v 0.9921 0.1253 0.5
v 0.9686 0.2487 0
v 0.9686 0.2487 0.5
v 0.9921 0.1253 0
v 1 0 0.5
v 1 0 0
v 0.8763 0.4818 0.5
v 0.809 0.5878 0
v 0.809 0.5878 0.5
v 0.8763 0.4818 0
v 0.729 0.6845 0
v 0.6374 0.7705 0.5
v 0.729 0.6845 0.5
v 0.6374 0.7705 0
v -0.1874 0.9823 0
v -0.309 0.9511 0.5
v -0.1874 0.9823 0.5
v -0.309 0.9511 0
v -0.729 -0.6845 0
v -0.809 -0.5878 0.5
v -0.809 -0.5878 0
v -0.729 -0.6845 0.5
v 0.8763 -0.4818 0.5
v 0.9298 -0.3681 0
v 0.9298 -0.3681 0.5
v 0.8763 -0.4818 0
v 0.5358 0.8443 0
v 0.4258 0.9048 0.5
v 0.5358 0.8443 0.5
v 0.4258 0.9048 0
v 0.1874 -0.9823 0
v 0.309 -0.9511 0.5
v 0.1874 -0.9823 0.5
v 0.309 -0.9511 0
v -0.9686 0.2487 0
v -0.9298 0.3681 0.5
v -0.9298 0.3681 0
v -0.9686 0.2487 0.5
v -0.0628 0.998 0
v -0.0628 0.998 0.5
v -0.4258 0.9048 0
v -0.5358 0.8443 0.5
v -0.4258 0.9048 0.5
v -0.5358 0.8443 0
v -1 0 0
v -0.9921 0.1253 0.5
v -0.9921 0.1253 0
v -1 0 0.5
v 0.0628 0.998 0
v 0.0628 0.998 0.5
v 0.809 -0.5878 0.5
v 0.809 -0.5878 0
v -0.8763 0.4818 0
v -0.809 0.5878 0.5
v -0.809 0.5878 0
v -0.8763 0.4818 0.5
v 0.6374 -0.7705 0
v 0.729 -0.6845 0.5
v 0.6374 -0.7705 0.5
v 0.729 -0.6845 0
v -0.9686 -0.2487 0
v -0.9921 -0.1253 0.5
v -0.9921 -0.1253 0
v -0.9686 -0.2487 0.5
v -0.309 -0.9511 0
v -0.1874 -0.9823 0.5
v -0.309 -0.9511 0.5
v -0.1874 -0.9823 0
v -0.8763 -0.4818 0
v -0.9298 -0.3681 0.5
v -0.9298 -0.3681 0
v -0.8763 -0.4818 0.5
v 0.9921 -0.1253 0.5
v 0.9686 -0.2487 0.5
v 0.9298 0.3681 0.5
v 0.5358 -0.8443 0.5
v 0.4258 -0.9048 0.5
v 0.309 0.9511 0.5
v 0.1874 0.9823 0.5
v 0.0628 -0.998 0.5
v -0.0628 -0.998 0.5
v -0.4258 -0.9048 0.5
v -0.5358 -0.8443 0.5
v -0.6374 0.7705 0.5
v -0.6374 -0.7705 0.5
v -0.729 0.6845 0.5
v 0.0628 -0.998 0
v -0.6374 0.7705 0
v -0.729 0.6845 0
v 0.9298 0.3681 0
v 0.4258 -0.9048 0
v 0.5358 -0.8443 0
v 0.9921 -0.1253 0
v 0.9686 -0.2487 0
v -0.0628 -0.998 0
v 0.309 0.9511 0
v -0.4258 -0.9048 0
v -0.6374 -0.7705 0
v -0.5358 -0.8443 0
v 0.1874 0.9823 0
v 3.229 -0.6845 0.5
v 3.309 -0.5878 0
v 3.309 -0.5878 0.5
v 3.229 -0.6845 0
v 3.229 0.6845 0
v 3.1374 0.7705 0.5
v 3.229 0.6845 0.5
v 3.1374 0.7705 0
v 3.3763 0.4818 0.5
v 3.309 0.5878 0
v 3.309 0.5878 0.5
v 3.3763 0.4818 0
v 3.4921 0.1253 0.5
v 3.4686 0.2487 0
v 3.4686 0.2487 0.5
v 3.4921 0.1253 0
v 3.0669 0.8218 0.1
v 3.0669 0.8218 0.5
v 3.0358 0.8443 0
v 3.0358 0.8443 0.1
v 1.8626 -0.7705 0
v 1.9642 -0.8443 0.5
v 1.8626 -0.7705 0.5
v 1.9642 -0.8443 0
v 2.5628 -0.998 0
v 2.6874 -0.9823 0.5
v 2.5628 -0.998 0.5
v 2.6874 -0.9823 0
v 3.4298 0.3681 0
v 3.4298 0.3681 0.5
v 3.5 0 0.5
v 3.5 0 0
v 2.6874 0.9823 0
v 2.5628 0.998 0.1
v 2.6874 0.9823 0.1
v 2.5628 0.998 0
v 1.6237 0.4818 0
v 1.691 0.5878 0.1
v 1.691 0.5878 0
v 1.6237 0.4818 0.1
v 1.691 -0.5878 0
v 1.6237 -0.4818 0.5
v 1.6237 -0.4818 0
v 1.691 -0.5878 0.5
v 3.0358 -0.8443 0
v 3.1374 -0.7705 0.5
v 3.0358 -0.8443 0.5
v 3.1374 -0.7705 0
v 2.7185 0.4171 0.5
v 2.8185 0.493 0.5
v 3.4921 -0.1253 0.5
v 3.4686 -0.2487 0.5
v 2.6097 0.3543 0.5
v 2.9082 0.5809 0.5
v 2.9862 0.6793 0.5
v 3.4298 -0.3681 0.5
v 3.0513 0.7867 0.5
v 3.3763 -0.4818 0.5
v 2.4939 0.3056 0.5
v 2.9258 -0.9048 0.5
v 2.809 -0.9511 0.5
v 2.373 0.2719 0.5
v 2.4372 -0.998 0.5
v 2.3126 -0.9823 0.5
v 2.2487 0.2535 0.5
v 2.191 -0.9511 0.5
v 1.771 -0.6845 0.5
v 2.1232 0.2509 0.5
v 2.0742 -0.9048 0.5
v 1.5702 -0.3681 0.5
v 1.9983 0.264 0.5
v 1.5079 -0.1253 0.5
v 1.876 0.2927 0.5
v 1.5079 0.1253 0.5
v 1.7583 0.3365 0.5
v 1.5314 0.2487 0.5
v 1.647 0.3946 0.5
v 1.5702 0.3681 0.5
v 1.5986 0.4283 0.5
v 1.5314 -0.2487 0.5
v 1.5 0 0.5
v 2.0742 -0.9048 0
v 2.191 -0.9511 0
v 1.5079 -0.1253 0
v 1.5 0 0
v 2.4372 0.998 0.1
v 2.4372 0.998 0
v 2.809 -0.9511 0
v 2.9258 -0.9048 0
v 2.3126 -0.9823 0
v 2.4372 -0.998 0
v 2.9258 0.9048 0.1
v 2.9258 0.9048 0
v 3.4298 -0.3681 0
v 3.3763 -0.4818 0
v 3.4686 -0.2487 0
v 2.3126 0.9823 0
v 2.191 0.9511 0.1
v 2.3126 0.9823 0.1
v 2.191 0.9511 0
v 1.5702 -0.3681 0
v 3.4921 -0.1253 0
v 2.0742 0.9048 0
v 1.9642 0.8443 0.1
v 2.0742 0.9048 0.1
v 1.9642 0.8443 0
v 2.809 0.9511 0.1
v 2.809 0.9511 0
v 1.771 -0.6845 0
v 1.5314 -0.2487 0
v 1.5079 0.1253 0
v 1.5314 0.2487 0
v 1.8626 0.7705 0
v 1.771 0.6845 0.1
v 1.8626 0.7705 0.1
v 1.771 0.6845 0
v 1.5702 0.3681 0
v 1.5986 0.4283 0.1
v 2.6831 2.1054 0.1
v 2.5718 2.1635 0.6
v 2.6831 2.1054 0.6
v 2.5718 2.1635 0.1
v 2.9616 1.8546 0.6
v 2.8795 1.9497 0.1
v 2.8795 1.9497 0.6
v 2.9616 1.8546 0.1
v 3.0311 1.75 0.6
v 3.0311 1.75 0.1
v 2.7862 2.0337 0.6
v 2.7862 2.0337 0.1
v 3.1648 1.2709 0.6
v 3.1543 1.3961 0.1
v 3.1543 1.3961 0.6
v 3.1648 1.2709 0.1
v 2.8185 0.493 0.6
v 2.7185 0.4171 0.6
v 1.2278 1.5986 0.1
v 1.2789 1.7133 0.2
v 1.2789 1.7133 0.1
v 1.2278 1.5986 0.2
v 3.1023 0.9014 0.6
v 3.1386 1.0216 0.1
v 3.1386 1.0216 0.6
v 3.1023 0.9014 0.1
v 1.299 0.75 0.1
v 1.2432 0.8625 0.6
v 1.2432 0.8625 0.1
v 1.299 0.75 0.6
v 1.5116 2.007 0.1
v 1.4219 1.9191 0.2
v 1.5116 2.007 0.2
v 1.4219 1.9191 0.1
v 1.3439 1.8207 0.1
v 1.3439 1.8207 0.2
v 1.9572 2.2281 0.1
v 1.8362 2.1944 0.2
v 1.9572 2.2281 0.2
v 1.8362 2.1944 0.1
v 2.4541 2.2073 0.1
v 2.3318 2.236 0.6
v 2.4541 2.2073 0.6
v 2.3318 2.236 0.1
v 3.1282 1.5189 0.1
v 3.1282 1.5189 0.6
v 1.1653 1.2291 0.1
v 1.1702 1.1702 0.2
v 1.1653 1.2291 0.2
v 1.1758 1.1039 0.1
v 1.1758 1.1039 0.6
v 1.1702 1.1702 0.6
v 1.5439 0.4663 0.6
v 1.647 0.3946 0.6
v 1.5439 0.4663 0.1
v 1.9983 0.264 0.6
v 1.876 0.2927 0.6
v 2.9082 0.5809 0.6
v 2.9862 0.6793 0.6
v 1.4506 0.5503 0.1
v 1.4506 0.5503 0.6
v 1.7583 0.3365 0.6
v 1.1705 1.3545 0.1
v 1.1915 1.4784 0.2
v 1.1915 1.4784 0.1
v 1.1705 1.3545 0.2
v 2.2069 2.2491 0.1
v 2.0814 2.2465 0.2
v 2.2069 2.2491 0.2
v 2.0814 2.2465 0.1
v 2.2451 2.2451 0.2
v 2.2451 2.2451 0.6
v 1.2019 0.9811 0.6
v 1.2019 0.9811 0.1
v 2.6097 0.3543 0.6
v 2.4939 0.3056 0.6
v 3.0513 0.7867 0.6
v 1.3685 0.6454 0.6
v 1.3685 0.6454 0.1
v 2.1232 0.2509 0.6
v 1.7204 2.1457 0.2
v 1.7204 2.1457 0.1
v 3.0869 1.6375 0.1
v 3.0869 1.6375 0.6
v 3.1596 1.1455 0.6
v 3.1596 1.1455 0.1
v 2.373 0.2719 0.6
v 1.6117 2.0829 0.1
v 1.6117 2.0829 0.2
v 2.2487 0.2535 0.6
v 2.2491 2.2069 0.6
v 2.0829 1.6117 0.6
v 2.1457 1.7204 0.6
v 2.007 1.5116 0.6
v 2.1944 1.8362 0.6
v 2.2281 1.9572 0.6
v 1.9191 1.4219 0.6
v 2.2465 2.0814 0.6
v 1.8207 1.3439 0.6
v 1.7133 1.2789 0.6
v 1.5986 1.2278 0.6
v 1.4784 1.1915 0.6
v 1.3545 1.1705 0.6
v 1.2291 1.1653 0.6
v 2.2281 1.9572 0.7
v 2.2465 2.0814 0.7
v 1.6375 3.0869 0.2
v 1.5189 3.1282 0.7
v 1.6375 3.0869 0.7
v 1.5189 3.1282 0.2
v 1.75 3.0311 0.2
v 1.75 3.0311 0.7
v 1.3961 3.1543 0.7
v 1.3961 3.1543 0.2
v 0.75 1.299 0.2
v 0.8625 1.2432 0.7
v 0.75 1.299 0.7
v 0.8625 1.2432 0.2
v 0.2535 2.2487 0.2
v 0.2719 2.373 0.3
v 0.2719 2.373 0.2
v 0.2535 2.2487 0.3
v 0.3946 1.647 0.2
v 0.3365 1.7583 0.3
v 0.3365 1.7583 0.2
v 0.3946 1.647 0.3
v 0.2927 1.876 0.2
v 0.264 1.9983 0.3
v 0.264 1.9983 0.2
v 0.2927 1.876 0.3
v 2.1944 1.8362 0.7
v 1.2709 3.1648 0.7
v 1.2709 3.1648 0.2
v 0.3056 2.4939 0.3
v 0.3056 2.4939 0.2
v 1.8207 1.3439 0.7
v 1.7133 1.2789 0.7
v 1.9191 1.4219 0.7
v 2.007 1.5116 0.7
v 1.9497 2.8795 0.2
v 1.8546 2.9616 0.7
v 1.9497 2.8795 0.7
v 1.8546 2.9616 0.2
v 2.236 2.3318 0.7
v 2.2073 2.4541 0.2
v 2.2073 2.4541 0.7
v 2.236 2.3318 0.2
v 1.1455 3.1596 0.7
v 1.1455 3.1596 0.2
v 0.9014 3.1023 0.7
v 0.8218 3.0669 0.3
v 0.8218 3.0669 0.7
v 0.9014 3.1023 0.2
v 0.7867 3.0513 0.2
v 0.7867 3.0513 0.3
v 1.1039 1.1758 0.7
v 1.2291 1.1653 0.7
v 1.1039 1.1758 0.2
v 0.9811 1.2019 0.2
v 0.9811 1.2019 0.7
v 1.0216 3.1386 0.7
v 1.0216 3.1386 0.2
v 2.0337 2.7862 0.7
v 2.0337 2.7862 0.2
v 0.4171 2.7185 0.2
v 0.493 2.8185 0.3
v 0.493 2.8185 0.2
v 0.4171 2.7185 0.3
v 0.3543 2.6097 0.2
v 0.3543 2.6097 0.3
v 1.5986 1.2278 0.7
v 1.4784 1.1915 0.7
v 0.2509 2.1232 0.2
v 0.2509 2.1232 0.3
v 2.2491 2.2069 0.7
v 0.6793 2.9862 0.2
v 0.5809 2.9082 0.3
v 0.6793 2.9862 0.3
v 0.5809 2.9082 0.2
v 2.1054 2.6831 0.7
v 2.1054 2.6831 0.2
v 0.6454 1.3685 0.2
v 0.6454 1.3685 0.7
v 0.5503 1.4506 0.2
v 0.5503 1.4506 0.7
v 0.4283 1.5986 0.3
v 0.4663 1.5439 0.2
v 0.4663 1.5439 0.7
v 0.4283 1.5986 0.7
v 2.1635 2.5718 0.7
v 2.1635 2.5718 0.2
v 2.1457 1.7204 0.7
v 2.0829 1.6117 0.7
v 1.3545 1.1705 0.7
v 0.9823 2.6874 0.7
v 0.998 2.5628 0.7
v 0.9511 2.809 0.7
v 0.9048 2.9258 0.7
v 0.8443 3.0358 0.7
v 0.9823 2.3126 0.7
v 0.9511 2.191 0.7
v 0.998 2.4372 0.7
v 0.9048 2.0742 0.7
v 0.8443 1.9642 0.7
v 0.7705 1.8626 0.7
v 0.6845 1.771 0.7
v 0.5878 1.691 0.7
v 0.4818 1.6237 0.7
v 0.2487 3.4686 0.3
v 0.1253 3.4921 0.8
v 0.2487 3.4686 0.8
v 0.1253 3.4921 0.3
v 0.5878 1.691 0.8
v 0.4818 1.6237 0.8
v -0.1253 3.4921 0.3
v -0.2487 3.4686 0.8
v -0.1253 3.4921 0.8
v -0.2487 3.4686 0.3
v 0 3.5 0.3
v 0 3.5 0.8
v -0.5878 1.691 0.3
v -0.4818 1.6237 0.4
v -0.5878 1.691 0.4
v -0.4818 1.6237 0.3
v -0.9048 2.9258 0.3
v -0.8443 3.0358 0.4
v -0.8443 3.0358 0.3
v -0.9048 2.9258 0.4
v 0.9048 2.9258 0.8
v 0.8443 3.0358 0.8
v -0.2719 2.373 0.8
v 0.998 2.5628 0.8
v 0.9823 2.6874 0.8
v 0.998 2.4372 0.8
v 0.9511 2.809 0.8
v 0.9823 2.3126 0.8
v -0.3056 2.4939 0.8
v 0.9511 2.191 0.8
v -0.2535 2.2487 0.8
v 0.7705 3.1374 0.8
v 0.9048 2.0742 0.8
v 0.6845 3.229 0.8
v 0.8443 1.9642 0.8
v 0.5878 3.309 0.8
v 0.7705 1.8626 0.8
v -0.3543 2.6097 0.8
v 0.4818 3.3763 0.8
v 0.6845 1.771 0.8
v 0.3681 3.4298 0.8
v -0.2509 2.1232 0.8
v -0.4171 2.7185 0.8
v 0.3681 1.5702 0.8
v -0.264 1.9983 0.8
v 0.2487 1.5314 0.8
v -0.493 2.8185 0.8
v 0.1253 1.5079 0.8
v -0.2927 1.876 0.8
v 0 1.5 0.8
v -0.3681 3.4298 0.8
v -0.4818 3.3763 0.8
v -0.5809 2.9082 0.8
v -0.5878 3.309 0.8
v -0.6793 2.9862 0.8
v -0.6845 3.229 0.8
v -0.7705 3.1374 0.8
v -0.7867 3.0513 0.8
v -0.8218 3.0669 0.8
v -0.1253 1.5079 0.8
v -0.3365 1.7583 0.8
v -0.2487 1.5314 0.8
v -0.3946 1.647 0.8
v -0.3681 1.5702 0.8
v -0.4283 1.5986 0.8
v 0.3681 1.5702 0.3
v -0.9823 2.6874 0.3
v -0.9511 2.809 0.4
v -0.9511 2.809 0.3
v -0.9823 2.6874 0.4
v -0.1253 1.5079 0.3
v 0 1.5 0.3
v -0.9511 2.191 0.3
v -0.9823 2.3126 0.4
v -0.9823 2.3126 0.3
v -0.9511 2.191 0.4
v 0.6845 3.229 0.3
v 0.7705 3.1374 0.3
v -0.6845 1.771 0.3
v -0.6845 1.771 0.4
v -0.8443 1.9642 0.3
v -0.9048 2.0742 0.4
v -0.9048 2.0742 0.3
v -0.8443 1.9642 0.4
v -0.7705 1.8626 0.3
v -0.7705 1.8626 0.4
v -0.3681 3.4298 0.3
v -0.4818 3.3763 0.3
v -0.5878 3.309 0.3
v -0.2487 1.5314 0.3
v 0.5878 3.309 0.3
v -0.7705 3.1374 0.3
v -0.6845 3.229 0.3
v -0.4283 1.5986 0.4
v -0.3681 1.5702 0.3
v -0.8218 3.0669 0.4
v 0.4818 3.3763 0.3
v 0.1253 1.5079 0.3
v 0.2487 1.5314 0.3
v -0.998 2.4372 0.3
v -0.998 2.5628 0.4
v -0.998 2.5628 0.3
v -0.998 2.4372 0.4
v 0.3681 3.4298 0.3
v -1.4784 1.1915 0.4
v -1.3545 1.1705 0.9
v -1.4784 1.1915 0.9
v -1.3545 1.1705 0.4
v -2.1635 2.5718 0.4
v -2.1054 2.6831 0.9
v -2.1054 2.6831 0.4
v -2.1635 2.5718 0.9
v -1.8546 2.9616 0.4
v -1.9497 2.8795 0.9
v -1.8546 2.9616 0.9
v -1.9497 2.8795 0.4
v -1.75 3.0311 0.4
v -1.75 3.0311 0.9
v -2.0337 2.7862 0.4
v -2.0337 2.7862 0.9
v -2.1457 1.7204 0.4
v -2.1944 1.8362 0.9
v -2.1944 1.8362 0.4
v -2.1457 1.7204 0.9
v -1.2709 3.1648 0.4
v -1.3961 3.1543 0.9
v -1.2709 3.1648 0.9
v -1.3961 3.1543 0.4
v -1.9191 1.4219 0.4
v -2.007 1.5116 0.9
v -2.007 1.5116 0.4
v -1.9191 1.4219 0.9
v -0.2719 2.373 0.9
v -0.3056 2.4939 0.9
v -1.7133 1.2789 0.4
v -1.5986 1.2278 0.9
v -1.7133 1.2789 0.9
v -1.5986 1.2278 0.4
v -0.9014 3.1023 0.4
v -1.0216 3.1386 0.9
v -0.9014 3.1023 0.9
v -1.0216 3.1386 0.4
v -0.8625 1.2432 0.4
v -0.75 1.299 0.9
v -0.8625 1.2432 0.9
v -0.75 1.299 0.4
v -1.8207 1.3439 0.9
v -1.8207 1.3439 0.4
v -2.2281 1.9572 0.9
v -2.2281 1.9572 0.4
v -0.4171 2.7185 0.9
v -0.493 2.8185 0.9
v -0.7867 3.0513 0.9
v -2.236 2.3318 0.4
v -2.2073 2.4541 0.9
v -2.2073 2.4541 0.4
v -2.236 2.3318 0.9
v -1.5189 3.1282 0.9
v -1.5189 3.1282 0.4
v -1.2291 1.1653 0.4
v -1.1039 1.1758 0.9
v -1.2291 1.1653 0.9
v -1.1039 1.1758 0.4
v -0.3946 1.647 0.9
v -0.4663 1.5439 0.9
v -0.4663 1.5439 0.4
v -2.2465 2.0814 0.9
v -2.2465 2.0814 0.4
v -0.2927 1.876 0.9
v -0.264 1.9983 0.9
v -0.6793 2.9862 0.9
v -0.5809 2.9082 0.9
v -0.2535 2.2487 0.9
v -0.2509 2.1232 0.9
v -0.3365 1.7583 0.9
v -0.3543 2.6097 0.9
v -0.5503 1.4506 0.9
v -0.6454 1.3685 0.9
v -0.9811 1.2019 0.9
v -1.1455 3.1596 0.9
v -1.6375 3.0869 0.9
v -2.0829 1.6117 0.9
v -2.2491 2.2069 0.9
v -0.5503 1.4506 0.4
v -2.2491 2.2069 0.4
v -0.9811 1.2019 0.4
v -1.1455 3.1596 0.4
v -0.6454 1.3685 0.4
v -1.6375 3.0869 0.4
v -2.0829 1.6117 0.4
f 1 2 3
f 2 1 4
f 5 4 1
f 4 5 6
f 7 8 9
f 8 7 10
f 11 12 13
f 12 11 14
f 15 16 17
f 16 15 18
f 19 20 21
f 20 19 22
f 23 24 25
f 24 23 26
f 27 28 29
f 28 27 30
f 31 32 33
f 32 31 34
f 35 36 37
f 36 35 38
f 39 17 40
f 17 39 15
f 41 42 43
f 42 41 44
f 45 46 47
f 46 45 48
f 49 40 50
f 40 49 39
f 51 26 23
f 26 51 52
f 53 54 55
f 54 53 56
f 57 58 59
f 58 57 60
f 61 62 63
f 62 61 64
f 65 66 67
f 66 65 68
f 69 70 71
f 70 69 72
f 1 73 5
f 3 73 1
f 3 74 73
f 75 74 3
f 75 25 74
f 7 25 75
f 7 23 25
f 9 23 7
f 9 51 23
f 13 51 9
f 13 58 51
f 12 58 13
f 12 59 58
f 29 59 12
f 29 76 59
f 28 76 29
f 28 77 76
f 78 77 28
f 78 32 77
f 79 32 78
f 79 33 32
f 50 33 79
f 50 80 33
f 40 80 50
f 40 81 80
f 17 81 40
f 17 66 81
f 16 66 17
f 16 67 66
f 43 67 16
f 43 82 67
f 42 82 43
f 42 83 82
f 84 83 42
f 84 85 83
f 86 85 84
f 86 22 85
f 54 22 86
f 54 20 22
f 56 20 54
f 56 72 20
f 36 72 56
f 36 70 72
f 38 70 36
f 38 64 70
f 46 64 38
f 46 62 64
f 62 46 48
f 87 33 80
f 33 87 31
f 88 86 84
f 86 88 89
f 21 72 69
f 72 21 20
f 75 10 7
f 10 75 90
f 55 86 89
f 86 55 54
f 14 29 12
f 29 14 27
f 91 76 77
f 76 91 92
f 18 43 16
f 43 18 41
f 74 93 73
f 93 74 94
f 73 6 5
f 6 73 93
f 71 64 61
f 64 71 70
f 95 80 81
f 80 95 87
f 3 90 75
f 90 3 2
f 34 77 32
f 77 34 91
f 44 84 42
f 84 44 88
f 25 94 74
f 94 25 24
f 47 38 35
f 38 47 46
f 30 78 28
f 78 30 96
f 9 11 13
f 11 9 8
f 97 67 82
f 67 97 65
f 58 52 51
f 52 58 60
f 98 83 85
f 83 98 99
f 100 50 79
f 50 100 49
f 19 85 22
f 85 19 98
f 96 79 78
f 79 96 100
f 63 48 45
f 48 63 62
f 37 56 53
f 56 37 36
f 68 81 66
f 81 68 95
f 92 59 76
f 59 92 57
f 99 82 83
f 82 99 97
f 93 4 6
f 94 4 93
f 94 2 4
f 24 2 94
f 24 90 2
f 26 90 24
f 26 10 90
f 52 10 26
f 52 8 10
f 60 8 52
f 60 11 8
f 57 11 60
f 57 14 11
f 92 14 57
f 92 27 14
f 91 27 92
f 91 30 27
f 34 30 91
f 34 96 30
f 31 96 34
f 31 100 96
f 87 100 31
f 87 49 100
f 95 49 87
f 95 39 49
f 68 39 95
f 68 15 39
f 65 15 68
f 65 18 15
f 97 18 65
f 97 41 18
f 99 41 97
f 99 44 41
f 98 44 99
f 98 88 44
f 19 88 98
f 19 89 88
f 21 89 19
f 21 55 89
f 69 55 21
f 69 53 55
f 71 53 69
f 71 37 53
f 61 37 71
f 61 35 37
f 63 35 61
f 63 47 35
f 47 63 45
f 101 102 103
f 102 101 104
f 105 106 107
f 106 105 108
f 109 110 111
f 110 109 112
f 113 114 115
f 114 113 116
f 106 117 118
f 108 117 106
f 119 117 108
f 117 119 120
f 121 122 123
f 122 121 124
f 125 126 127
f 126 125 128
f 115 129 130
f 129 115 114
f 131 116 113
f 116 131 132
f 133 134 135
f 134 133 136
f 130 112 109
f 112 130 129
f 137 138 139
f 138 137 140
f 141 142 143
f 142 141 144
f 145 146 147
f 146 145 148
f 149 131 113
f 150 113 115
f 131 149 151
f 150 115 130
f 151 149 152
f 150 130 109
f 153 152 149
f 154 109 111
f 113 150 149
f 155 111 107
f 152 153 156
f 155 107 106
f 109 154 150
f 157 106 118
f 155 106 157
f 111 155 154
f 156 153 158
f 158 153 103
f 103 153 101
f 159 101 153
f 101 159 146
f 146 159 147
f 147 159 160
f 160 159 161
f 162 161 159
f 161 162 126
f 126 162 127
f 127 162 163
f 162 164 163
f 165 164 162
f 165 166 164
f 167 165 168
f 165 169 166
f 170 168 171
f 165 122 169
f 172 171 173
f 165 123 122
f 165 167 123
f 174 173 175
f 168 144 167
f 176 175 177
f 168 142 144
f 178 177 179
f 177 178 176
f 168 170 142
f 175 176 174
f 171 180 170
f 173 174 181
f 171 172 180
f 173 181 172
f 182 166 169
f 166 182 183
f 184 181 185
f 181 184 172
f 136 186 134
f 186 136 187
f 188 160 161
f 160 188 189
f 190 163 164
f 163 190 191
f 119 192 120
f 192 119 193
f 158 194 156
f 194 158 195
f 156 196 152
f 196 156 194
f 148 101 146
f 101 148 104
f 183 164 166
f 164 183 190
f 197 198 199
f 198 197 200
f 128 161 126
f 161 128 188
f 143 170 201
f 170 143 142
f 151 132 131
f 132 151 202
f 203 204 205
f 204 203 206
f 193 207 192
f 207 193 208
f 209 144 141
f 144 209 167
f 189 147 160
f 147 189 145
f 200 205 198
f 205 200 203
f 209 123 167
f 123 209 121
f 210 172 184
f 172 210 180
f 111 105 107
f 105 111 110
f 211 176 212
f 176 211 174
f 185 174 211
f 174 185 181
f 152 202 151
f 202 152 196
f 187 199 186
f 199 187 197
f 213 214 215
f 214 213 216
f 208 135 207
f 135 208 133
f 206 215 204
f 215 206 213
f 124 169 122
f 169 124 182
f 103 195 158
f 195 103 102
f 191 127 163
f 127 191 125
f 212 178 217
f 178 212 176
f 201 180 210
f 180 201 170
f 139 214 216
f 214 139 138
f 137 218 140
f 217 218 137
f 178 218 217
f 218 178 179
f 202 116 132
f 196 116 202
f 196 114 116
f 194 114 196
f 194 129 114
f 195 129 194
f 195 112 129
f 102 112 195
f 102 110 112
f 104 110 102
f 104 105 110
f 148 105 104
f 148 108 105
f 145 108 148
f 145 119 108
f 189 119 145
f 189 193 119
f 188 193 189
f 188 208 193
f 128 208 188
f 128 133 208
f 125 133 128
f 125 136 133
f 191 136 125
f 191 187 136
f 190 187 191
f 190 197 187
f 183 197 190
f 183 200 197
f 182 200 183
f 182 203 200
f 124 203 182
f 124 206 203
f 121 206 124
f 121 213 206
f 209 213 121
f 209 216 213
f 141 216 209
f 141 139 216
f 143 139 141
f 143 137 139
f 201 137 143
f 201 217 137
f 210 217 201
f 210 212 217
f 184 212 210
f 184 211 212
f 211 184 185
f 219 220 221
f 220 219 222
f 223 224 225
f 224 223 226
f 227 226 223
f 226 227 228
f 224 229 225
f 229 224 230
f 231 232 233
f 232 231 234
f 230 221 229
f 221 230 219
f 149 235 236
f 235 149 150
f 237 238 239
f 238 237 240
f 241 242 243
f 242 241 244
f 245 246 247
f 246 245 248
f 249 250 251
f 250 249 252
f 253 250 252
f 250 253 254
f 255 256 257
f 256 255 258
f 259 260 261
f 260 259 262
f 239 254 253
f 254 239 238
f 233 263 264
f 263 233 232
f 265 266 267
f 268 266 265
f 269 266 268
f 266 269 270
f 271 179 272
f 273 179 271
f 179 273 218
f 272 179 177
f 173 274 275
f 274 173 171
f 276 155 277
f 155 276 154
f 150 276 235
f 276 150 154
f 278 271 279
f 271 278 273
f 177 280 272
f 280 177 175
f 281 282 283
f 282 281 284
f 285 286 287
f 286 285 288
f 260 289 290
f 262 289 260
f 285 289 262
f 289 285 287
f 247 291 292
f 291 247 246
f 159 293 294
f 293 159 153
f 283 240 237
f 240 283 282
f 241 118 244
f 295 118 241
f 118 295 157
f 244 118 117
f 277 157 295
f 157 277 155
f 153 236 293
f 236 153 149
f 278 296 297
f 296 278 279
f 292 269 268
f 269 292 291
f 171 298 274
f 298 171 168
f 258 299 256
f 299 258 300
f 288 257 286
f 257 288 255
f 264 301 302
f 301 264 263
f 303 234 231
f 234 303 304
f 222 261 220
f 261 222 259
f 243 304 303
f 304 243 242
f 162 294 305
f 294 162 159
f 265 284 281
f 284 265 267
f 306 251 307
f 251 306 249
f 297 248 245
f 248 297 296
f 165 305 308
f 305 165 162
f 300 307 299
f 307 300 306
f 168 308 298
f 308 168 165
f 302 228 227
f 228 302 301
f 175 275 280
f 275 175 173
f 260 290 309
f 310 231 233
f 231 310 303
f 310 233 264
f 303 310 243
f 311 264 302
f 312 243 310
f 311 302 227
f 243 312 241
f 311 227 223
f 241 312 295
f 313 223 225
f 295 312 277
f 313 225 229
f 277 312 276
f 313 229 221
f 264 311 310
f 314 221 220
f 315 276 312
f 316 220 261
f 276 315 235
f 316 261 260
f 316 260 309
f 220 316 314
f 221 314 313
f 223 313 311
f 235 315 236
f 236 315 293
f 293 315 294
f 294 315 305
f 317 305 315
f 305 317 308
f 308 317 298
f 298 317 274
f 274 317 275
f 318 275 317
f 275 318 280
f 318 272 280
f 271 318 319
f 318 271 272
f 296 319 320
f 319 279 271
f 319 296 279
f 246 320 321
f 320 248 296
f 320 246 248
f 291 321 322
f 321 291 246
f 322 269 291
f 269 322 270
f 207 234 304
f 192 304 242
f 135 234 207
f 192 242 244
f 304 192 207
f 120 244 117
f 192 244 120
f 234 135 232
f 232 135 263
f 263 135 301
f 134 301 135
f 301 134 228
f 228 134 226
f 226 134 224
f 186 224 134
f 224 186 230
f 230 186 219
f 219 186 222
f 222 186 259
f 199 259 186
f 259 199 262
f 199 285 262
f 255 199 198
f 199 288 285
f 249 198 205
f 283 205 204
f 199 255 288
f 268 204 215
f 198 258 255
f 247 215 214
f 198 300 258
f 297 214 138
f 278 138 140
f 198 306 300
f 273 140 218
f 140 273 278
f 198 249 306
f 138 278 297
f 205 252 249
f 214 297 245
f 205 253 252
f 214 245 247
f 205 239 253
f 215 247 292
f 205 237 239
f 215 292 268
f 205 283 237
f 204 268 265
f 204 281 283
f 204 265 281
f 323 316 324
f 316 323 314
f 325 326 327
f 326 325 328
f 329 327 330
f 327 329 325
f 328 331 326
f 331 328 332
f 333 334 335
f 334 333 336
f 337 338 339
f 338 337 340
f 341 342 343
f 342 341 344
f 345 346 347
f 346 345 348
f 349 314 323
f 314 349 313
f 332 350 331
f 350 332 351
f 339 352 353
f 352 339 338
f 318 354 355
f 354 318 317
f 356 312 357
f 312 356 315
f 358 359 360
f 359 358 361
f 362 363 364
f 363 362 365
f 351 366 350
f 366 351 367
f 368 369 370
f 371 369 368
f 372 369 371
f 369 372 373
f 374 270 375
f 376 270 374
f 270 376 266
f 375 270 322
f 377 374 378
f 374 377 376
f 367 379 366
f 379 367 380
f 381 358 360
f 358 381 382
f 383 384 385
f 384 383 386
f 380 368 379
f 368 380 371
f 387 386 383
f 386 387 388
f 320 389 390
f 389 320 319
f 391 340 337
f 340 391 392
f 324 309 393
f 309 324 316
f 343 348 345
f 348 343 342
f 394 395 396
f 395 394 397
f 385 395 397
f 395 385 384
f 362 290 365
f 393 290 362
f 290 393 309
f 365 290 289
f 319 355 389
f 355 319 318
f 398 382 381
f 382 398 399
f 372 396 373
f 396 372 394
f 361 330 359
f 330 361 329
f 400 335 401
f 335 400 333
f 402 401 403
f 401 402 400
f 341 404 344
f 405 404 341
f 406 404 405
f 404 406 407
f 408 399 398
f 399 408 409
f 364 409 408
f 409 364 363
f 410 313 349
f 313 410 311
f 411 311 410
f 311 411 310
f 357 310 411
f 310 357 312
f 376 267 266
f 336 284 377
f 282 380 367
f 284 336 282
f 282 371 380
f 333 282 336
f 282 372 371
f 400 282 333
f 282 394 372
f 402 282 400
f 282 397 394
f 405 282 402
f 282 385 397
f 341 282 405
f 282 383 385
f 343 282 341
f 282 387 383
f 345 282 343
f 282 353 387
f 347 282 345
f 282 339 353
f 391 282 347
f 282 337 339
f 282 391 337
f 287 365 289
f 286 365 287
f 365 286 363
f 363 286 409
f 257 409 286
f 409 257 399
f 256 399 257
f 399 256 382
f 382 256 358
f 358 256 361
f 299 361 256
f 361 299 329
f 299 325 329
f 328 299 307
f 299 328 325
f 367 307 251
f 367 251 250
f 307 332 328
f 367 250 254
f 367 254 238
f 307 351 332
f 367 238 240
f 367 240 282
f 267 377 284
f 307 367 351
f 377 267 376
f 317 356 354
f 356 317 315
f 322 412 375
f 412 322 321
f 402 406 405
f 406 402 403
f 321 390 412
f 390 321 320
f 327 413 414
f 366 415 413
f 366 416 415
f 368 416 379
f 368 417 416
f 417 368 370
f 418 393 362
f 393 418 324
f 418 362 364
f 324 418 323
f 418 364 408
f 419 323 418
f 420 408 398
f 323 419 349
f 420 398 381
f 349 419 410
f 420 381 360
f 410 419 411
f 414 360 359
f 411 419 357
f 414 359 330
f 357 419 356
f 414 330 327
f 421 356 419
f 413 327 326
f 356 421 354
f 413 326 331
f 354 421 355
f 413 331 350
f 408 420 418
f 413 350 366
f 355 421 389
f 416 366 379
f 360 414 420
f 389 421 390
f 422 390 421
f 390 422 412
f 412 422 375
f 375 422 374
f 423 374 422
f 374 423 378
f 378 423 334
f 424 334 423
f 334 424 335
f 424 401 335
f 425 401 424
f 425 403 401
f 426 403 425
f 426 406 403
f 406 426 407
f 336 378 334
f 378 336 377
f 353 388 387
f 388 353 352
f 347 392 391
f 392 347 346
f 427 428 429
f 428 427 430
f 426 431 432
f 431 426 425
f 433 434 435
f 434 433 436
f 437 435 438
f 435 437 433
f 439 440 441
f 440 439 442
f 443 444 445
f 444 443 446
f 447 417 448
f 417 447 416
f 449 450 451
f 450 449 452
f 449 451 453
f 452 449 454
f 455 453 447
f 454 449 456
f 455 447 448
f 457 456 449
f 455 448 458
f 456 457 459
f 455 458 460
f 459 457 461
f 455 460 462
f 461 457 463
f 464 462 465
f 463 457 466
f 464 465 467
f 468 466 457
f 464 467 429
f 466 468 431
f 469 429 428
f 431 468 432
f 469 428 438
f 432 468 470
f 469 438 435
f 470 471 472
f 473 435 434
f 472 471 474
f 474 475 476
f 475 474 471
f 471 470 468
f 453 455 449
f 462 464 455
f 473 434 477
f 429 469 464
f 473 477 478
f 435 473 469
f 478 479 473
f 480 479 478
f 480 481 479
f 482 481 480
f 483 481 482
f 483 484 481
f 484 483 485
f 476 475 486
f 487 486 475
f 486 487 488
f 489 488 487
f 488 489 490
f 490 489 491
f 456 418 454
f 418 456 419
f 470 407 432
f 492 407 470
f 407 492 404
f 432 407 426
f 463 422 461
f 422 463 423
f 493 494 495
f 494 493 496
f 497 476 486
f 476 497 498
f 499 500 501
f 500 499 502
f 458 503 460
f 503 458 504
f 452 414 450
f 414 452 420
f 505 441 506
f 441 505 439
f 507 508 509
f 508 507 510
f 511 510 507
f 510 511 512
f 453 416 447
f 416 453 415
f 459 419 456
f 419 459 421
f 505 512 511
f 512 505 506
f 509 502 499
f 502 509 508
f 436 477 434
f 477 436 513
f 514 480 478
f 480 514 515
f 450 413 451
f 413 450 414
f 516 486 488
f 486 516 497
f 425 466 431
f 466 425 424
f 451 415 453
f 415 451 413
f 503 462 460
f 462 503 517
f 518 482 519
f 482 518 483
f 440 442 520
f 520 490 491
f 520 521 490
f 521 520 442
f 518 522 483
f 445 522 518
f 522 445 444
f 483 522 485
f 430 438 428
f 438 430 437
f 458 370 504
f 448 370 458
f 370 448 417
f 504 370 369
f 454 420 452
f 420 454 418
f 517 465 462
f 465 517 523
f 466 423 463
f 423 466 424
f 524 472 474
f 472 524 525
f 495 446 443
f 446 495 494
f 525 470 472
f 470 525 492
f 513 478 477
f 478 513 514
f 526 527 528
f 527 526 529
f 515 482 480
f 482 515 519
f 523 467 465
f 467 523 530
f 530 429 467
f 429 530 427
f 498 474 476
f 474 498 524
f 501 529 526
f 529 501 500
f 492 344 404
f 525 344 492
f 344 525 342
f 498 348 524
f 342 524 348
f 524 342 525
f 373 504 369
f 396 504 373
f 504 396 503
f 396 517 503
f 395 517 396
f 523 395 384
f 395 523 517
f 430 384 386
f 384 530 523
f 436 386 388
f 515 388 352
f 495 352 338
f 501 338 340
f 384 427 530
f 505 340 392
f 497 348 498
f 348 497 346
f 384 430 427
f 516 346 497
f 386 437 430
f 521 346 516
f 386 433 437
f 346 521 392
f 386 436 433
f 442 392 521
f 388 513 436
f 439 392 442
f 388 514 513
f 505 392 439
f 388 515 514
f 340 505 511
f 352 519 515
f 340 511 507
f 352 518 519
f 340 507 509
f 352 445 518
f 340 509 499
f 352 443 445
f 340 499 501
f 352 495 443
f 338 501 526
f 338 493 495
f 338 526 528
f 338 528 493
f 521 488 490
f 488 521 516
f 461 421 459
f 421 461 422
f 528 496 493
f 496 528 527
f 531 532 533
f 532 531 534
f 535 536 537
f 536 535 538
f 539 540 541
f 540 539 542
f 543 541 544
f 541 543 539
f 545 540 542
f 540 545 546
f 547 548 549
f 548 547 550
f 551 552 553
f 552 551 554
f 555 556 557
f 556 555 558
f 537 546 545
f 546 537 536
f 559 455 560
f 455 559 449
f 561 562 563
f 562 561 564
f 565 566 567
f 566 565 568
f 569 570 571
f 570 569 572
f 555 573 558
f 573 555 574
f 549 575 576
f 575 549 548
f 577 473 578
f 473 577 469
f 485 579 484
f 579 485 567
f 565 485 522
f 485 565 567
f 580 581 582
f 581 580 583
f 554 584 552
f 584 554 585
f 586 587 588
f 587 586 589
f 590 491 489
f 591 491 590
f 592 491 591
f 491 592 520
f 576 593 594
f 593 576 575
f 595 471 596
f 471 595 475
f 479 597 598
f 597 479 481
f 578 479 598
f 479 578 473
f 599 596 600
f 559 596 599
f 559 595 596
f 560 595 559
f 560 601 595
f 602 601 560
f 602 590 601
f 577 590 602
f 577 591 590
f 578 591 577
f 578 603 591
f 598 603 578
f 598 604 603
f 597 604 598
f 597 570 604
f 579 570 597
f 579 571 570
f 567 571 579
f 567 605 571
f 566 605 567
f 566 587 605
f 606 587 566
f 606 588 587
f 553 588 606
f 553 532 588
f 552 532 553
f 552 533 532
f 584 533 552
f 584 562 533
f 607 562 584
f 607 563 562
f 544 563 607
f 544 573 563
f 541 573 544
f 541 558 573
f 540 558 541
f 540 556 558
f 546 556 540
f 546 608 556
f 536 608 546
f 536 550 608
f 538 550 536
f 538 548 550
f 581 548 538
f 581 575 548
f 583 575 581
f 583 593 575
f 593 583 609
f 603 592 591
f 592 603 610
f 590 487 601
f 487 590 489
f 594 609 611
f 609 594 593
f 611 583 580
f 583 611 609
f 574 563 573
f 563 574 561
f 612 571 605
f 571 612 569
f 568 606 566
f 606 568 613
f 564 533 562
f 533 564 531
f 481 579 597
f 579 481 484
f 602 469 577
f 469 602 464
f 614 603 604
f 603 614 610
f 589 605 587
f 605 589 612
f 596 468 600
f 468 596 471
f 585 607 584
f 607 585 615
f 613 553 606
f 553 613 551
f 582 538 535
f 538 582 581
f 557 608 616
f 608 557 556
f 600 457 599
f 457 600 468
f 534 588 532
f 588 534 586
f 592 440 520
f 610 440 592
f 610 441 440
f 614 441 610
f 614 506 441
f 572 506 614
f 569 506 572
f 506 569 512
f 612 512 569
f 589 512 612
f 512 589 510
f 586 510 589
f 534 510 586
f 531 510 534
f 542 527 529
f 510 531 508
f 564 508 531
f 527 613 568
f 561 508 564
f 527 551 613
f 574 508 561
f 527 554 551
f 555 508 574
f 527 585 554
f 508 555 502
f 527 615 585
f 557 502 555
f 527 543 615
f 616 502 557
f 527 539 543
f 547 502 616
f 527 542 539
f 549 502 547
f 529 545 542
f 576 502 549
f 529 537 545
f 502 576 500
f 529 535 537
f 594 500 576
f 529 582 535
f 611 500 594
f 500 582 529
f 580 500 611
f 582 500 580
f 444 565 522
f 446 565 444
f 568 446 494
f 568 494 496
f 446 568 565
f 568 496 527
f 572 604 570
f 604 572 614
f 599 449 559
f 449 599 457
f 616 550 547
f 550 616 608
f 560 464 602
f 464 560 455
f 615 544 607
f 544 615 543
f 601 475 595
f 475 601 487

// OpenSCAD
// Generated by SolidPython 1.1.1 on 2021-11-15 13:46:23
$fn = 50;


union() {
	cylinder(h = 0.5000000000, r = 1);
	rotate(a = [0, 0, 0]) {
		translate(v = [2.5000000000, 0, 0]) {
			cylinder(h = 0.5000000000, r = 1);
		}
	}
	rotate(a = [0, 0, 30]) {
		translate(v = [2.5000000000, 0, 0.1000000000]) {
			cylinder(h = 0.5000000000, r = 1);
		}
	}
	rotate(a = [0, 0, 60]) {
		translate(v = [2.5000000000, 0, 0.2000000000]) {
			cylinder(h = 0.5000000000, r = 1);
		}
	}
	rotate(a = [0, 0, 90]) {
		translate(v = [2.5000000000, 0, 0.3000000000]) {
			cylinder(h = 0.5000000000, r = 1);
		}
	}
	rotate(a = [0, 0, 120]) {
		translate(v = [2.5000000000, 0, 0.4000000000]) {
			cylinder(h = 0.5000000000, r = 1);
		}
	}
}
/***********************************************
*********      SolidPython code:      **********
************************************************
 
# SolidPython example code 
# Brygg Ullmer, Clemson University
# Written 2021-10-28

from solid import *        # load in SolidPython/SCAD support code

outGeom = c1 = cylinder(r=1, h=.5)
count = 5; rot  = 0; rotIncr = 30
z = 0; dz = .1

for i in range(count):
  c2 = translate([2.5,0,z])(c1)
  c3 = rotate([0,0,rot])(c2)
  outGeom += c3; rot += rotIncr; z += dz

radialSegments = 50; hdr = '$fn = %s;' % radialSegments # create a header for the export
scad_render_to_file(outGeom, 'exTg03.scad', file_header=hdr) # write the .scad file

### end ###

 
 
************************************************/
